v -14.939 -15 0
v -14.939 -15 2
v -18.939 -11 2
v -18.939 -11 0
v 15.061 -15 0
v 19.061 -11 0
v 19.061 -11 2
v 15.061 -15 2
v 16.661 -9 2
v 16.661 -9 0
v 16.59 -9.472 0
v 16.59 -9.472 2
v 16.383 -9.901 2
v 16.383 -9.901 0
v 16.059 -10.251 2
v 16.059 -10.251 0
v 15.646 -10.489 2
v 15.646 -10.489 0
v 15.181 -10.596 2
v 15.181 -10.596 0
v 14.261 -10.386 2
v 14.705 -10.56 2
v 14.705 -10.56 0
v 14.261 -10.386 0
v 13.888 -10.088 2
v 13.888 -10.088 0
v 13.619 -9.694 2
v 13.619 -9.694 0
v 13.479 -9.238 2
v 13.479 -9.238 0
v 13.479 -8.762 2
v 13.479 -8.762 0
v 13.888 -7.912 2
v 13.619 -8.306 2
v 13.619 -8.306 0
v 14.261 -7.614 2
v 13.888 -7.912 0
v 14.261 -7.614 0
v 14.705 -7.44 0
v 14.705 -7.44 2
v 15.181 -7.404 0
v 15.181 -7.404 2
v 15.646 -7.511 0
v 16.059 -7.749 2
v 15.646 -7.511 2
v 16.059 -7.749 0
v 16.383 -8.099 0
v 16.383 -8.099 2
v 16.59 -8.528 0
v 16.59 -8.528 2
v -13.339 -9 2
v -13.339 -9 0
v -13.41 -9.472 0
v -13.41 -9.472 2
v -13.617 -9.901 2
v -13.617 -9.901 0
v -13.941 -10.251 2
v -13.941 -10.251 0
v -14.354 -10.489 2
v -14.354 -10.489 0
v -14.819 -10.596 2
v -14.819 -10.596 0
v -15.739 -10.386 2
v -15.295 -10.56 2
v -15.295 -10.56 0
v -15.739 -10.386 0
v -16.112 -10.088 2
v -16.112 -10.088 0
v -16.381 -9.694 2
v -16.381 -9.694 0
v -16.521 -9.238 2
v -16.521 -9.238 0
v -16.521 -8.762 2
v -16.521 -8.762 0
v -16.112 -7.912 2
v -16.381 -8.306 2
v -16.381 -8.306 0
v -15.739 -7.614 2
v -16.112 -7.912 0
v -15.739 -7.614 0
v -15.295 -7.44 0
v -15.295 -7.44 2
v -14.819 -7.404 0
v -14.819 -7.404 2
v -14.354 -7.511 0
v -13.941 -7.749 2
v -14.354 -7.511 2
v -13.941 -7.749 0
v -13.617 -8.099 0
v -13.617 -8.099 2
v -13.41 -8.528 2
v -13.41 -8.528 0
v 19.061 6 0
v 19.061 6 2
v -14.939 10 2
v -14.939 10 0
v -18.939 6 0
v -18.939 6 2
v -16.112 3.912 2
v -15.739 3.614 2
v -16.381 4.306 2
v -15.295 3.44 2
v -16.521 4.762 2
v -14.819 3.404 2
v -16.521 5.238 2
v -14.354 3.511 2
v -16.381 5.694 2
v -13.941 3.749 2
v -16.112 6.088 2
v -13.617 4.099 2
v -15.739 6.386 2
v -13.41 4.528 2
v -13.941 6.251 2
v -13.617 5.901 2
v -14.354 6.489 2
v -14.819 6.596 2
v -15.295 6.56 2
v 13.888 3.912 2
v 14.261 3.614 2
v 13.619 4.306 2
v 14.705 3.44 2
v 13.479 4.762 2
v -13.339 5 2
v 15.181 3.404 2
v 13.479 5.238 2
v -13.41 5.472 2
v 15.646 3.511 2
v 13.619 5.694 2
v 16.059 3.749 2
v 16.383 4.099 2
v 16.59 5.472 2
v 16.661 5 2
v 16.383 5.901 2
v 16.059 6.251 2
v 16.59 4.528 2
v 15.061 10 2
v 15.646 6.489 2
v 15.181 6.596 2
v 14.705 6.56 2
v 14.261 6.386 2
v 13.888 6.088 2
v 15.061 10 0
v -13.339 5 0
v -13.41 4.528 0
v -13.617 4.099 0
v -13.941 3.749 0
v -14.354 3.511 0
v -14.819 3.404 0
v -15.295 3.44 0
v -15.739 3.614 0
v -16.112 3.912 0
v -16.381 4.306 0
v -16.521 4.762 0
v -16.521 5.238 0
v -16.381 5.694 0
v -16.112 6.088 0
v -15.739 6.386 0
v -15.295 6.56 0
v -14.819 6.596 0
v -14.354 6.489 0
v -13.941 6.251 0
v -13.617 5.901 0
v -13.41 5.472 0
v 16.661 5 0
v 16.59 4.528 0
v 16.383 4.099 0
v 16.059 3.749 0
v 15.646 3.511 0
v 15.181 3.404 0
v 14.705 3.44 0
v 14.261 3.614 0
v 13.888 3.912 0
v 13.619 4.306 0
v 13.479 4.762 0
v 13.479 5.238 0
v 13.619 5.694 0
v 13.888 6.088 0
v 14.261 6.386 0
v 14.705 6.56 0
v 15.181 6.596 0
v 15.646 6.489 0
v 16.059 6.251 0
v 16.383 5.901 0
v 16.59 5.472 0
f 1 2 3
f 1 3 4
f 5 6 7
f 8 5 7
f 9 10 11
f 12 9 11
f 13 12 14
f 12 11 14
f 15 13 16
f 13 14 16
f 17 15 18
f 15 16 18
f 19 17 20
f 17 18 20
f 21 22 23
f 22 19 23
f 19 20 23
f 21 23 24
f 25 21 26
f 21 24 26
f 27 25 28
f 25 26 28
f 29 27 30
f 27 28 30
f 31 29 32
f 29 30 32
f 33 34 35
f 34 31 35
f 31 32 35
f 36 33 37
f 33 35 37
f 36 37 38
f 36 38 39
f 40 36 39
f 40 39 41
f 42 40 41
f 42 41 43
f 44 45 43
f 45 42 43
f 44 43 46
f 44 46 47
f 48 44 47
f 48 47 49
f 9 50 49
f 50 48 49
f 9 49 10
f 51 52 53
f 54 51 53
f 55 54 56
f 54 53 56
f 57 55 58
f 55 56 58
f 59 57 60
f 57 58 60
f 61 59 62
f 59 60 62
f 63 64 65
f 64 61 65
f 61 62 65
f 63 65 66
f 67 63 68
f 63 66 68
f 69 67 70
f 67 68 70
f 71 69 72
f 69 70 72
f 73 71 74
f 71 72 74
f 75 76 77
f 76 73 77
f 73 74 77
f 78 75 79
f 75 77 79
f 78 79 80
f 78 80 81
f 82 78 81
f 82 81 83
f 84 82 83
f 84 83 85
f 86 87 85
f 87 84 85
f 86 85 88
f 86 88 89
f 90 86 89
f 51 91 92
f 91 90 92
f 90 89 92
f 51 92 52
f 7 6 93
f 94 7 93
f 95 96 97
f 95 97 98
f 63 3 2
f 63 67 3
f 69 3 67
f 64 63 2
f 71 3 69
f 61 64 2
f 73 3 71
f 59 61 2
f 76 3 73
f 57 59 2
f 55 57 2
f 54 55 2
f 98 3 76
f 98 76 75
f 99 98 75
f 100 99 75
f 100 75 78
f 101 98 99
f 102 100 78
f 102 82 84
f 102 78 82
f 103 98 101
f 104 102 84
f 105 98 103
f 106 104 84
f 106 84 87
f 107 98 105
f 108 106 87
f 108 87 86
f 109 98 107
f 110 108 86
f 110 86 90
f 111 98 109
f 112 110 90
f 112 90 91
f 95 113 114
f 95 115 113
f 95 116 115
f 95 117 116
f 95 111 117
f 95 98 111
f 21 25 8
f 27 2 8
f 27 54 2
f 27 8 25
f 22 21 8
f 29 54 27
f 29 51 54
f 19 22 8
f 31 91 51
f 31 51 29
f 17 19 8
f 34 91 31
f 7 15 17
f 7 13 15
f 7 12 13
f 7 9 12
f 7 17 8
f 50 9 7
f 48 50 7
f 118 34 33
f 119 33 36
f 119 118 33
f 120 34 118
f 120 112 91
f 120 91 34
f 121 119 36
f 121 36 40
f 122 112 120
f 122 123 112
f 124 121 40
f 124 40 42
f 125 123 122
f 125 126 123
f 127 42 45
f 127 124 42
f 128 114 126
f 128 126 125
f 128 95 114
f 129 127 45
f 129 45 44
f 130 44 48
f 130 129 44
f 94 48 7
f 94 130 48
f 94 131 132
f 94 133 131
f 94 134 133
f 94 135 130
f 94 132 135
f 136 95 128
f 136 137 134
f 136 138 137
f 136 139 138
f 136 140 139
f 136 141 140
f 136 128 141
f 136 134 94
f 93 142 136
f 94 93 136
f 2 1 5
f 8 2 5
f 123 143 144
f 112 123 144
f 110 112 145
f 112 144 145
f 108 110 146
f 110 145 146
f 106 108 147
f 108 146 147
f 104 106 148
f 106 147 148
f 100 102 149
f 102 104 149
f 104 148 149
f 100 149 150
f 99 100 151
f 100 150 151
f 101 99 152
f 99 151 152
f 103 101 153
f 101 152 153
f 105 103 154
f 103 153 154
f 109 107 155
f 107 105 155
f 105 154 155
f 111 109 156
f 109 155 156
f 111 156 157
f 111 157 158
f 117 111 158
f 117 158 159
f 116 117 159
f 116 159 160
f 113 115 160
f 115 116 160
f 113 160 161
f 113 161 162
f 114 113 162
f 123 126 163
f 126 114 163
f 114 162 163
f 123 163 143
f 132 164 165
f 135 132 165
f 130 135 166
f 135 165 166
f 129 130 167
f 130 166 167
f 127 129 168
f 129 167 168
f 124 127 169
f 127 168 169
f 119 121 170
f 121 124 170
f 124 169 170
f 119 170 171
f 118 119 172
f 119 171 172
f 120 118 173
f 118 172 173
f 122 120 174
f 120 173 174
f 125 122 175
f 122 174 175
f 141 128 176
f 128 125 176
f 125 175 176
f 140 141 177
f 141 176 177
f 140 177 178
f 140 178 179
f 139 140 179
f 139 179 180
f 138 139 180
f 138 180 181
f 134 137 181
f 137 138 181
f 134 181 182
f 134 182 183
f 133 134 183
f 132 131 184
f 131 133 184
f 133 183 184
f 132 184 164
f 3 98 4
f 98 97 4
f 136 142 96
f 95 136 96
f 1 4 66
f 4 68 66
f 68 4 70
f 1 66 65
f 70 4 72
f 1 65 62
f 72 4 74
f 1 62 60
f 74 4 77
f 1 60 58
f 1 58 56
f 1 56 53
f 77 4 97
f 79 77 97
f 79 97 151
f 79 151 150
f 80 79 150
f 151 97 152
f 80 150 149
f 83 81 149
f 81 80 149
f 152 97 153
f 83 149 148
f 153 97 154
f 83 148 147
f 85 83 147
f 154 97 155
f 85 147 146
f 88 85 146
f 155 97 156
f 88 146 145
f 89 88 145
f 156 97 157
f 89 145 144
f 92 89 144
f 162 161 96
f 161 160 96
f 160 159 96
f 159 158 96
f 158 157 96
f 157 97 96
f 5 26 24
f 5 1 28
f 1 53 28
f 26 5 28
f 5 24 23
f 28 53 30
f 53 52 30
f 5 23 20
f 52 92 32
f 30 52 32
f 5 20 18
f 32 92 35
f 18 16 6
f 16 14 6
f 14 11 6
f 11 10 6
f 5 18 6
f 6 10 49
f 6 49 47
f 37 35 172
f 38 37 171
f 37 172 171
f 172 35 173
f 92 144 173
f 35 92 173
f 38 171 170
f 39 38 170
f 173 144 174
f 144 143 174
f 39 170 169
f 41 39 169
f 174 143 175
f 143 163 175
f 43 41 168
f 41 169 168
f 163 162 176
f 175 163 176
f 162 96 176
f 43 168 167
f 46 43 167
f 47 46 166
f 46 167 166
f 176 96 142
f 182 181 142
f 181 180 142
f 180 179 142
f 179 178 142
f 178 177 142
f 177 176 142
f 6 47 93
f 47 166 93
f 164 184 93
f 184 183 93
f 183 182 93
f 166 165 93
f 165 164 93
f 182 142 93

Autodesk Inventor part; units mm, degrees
ref_plane "YZ Plane" through (0, 0, 0) normal (1, 0, 0) x (0, 1, 0)
ref_plane "XZ Plane" through (0, 0, 0) normal (0, 1, 0) x (-1, 0, 0)
ref_plane "XY Plane" through (0, 0, 0) normal (0, 0, 1) x (1, 0, 0)
sketch "Эскиз1" plane through (0, 0, 0) normal (0, 0, 1) x (1, 0, 0)
  line L0 (-18.939, -15) -> (19.061, -15)
  line L1 (19.061, -15) -> (19.061, 10)
  line L2 (19.061, 10) -> (-18.939, 10)
  line L3 (-18.939, 10) -> (-18.939, -15)
  circle A0 centre (-14.939, 5) radius 1.6
  circle A1 centre (-14.939, -9) radius 1.6
  circle A2 centre (15.061, 5) radius 1.6
  circle A3 centre (15.061, -9) radius 1.6
  point P0 (0, 0)
  dimension "d0" = 38
  dimension "d5" = 3.2
  dimension "d7" = 14
  dimension "d16" = 3.2
  dimension "d17" = 3.2
  dimension "d18" = 3.2
  dimension "d19" = 5
  dimension "d20" = 14
  dimension "d21" = 6
  dimension "d22" = 6
  dimension "d23" = 4
  dimension "d25" = 4
  dimension "d26" = 4
extrude "Выдавливание1" add sketch "Эскиз1" along normal blind 2
chamfer "Фаска1" distance 4 angle 45 4 edges at (19.061, 10, 1) (-18.939, 10, 1) (19.061, -15, 1) (-18.939, -15, 1)
properties part number "стена_простая"
